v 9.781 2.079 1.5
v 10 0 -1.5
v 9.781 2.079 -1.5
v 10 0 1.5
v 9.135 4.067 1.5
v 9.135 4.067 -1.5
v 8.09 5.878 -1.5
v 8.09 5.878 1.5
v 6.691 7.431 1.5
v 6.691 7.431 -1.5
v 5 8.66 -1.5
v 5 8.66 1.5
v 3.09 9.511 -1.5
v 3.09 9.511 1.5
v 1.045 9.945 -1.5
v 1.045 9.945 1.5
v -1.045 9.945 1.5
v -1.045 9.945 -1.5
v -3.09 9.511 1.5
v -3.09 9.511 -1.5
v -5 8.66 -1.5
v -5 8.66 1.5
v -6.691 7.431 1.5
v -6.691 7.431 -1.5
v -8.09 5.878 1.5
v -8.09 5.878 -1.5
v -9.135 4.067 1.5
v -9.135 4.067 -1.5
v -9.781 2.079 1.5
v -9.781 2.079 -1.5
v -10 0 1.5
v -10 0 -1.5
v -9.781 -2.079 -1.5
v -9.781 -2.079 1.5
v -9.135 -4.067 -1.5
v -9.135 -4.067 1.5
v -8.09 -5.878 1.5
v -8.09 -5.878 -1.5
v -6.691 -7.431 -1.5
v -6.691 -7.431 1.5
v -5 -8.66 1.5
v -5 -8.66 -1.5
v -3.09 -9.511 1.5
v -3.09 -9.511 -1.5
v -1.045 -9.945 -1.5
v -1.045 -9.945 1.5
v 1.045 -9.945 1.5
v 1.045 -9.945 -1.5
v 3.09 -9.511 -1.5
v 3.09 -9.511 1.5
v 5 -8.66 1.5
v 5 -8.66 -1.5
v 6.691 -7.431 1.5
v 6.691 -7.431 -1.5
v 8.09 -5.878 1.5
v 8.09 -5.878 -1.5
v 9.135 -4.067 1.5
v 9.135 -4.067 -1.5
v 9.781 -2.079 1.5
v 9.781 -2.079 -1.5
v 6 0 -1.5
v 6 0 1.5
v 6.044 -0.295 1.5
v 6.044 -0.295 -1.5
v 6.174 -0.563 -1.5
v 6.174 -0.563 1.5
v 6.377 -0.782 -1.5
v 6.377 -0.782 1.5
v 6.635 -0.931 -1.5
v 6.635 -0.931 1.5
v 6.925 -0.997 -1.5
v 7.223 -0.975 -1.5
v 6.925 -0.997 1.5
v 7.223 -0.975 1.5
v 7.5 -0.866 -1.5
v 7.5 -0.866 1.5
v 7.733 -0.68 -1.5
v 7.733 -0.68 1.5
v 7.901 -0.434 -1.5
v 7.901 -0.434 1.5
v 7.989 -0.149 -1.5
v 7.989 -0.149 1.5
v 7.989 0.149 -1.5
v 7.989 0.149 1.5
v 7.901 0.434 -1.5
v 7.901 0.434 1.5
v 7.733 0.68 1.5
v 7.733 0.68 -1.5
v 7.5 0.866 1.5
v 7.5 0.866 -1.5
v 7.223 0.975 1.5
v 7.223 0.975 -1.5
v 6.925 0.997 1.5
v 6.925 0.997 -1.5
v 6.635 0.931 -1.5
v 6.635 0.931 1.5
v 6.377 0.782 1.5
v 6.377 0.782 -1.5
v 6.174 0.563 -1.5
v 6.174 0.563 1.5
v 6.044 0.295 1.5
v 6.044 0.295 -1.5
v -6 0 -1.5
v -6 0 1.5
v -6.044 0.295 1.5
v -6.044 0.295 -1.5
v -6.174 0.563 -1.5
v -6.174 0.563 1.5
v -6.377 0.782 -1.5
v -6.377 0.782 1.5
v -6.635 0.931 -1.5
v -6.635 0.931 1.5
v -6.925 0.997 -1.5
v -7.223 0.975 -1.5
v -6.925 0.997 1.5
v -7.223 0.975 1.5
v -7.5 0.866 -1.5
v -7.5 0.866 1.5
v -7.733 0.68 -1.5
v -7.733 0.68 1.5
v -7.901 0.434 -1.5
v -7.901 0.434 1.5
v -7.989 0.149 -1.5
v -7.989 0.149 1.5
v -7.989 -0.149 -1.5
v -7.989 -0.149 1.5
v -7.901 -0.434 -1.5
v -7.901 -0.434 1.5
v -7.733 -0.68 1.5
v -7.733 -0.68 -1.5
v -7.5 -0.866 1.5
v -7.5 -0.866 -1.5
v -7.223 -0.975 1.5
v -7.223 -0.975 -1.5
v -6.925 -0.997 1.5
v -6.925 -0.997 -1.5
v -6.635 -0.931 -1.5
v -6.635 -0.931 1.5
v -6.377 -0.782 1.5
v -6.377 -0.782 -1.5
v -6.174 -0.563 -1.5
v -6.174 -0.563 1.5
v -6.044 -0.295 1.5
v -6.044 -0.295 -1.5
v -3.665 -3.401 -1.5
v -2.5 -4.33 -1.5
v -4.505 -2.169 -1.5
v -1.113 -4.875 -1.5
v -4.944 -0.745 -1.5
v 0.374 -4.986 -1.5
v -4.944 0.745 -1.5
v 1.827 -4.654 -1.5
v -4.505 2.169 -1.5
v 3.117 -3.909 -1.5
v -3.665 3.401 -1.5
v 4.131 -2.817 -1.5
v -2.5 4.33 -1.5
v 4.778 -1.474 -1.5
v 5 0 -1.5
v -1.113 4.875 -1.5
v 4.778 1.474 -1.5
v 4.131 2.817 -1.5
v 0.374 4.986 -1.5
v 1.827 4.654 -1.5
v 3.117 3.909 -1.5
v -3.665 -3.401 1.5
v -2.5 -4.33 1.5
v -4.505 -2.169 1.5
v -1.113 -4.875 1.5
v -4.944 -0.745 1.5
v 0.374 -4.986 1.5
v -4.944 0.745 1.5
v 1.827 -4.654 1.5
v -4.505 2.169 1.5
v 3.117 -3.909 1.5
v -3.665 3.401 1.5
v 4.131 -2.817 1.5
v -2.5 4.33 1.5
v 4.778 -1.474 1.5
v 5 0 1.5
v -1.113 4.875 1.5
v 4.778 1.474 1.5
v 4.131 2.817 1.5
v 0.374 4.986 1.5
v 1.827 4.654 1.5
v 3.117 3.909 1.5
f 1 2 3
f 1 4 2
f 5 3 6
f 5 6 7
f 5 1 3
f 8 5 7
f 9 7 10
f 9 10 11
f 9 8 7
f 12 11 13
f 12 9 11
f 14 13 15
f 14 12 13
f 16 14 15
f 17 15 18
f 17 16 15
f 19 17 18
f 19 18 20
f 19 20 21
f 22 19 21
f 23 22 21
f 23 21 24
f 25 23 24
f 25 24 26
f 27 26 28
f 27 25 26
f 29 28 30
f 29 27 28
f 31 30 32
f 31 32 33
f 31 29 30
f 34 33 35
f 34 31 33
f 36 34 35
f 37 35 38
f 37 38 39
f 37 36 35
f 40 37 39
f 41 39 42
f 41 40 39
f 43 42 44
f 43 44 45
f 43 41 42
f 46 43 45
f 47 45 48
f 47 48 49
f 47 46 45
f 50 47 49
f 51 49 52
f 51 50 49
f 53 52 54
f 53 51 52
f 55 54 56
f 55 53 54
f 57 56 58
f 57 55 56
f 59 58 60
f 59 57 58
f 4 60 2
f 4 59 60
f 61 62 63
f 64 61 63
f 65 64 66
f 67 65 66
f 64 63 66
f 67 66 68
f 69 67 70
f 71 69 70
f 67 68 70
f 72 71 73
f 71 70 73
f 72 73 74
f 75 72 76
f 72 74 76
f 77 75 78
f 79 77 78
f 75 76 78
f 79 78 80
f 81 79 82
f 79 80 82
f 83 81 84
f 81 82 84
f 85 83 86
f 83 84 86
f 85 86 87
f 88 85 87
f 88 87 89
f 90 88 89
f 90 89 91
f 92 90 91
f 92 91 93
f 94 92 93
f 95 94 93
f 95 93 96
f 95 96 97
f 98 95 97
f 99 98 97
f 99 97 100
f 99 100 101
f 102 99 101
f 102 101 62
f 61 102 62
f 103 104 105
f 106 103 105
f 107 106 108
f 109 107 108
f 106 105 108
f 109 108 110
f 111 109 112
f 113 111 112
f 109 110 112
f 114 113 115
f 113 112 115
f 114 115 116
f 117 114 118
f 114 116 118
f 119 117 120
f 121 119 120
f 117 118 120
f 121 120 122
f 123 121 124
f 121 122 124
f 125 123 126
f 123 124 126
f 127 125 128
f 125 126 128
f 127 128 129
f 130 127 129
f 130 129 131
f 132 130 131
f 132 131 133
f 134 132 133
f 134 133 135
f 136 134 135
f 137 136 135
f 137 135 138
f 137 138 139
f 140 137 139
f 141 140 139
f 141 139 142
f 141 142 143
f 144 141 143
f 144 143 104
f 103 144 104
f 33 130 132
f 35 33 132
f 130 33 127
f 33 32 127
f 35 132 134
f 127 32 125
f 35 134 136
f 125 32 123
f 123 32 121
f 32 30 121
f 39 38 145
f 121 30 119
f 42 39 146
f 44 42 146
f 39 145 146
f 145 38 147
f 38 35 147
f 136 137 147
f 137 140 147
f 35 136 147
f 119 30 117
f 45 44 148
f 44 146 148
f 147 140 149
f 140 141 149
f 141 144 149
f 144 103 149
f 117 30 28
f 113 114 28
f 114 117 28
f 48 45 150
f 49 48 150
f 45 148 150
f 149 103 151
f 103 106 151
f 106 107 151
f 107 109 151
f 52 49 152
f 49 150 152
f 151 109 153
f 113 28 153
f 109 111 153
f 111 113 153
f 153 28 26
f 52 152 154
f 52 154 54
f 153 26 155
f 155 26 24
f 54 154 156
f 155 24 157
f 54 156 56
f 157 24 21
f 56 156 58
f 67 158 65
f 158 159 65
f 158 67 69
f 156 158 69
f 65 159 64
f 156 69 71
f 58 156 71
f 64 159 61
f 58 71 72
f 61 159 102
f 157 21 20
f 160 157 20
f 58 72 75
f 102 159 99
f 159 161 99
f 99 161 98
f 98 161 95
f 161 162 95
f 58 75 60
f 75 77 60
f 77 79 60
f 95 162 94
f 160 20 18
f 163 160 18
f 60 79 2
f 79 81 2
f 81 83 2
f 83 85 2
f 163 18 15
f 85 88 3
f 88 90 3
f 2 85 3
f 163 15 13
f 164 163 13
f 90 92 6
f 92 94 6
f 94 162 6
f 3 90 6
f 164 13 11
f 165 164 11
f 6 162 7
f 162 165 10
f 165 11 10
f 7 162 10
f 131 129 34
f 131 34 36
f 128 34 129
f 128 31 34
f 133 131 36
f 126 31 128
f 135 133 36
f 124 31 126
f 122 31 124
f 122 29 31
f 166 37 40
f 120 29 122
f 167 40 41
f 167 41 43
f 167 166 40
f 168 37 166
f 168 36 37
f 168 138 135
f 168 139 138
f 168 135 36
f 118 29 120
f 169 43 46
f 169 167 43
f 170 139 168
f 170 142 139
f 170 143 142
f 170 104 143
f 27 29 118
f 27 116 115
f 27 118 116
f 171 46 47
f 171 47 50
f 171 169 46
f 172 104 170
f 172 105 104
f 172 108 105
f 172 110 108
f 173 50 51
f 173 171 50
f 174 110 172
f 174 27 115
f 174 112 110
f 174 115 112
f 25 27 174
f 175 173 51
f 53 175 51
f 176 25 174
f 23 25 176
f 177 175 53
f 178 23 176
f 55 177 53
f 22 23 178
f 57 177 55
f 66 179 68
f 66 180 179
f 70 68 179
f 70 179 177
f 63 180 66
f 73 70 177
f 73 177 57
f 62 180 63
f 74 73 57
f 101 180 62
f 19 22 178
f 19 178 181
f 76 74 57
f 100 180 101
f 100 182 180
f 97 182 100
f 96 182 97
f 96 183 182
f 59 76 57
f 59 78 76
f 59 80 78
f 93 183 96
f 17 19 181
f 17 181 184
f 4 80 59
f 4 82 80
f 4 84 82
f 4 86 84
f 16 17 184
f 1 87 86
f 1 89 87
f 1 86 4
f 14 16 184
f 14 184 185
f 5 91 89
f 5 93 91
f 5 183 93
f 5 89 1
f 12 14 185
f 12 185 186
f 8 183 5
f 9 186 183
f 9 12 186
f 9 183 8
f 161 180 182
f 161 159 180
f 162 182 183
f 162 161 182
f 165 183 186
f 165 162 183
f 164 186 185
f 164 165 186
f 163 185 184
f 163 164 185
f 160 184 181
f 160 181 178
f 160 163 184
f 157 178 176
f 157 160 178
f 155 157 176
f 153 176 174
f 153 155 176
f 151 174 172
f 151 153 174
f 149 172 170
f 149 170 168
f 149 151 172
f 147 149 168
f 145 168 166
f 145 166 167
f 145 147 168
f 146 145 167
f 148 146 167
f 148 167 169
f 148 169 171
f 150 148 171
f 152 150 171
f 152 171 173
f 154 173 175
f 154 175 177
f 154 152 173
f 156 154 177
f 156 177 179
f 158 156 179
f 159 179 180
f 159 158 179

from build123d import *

# Parameters (mm, degrees)
SKETCH1_R               = 10
SKETCH1_R_2             = 5
BOSS_EXTRUDE1_DEPTH     = 1.5
SKETCH3_R               = 1
ALIGNMENTHOLE_CUT_DEPTH = 15.456832295
CIRPATTERN1_COUNT       = 2


with BuildPart() as part:
    # Sketch1 → Boss-Extrude1 (new, symmetric)
    with BuildSketch(Plane.XY):
        Circle(SKETCH1_R)
        Circle(SKETCH1_R_2, mode=Mode.SUBTRACT)
    extrude(amount=BOSS_EXTRUDE1_DEPTH, both=True)

    # Sketch3 → AlignmentHole-Cut (cut, through all)
    with BuildSketch(Plane.XY.offset(1.5)):
        with Locations((-7, 0)):
            Circle(SKETCH3_R)
    alignmenthole_cut = extrude(amount=-ALIGNMENTHOLE_CUT_DEPTH, mode=Mode.SUBTRACT)

    # CirPattern1: AlignmentHole-Cut ×2 about axis
    cirpattern1_axis = Axis((0, 0, 0), (0, 0, 1))
    for i in range(1, CIRPATTERN1_COUNT):
        add(alignmenthole_cut.rotate(cirpattern1_axis, i * 360 / CIRPATTERN1_COUNT), mode=Mode.SUBTRACT)


solid = part.part
